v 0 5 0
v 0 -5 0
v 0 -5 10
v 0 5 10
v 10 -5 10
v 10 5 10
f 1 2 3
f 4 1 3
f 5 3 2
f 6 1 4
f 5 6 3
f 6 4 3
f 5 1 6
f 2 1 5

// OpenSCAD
X=10;
Y=10;
Z=10;
cube_size = 20; // [10:Small,20:Medium,30:Large]

hole_diameter = 2.5;
hole_radius = hole_diameter/2;

// How deep should the center hole be?
hole_depth = 1; // [0,1,5,50]

show_wheels = "yes"; // [yes,no]

// How thick should the side wheels be?
wheel_thickness = 1; // [1:20]

// ignore this variable!
// foo=1;

// don't turn functions into params!
function BEZ03(u) = pow((1-u), 3);

// ignore variable values
bing = 3+4;
baz = 3 / hole_depth;
module object1(scale) {polyhedron(points = [[0, -10, 60], [0, 10, 60], [0, 10, 0], [0, -10, 0], [60, -10, 60], [60, 10, 60]], 
triangles = [[0,3,2], [0,2,1], [3,0,4], [1,2,5], [0,5,4], [0,1,5],  [5,2,4], [4,2,3], ]);}

resize(newsize=[X,Y,Z]) object1(1);
